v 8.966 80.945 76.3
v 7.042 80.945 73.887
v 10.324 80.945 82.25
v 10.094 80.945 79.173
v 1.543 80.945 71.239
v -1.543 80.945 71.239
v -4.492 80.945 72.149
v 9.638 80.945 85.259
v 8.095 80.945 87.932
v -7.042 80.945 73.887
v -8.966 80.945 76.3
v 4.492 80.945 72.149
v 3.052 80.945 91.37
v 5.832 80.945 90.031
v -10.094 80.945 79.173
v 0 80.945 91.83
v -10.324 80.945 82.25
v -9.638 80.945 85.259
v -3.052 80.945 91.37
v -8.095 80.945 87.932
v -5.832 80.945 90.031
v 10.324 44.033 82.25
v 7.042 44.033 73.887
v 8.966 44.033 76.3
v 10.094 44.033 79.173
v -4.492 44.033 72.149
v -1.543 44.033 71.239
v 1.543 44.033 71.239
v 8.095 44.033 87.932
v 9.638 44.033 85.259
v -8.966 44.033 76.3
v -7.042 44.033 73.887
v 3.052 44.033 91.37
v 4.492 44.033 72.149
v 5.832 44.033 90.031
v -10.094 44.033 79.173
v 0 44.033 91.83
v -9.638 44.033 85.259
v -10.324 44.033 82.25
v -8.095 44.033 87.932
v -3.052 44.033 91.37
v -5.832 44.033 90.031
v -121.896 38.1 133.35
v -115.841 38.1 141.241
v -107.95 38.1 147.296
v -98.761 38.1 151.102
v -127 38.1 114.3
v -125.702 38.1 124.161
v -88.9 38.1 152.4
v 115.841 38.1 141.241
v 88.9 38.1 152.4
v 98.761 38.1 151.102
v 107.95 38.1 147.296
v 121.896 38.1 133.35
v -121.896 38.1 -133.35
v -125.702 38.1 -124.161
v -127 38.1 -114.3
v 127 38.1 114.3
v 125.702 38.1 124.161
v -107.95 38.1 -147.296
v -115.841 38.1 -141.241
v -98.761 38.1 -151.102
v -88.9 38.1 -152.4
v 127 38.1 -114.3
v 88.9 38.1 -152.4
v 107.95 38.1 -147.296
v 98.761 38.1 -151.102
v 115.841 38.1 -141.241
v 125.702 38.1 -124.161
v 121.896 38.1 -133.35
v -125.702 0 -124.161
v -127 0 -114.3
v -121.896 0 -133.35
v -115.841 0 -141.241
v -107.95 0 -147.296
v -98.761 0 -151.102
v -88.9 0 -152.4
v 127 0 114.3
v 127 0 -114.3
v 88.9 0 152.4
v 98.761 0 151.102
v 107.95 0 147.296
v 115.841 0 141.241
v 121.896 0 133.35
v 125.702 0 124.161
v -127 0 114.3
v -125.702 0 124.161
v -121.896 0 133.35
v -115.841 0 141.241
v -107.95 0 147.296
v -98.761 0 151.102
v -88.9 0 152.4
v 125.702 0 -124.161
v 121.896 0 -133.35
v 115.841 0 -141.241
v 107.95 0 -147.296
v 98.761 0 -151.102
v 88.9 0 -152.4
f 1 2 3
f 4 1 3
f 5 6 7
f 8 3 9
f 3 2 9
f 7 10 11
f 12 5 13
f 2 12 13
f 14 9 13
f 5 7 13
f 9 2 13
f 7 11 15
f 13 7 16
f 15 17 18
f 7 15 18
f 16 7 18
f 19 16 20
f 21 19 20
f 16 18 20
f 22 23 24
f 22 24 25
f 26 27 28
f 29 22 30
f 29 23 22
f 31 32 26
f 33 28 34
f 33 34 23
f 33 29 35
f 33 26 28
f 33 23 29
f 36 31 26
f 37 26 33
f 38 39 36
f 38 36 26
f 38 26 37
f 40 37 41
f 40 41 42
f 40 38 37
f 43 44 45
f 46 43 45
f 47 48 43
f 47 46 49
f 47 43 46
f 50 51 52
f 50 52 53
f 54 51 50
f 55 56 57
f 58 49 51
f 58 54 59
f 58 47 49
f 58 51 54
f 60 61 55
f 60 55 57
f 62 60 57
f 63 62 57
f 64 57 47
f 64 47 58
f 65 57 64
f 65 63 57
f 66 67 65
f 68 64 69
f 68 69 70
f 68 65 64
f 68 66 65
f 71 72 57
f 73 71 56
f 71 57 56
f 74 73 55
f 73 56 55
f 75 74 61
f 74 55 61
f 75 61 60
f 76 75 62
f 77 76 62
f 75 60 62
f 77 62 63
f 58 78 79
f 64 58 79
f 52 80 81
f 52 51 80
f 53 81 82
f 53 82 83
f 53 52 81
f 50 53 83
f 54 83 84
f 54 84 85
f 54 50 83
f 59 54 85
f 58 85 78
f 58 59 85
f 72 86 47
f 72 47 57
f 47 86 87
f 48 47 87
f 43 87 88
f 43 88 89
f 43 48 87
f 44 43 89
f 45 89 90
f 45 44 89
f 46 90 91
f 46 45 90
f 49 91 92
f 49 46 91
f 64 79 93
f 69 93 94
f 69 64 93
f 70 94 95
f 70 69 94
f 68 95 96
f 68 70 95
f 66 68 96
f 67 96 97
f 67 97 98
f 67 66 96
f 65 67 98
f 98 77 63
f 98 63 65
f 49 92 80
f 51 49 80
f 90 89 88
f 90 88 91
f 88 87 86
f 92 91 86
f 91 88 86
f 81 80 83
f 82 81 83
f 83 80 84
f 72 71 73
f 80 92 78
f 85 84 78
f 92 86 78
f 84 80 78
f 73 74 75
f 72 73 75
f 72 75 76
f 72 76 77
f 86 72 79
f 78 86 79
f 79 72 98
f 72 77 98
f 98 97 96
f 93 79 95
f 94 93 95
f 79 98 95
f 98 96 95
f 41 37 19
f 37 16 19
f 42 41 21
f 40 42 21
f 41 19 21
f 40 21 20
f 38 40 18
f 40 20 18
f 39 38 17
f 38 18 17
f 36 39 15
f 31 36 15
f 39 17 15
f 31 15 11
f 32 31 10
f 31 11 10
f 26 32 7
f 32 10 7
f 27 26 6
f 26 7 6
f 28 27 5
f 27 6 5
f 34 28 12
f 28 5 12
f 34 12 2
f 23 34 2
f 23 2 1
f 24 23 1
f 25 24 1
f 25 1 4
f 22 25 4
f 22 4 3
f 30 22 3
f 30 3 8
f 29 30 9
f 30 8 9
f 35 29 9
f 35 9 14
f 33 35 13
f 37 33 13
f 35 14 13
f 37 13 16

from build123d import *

# Parameters (mm, degrees)
SKETCH1_W           = 254
SKETCH1_H           = 304.8
BOSS_EXTRUDE1_DEPTH = 38.1
FILLET1_R           = 38.1
SKETCH4_W           = 10.353395652
SKETCH4_H           = 36.912106238


with BuildPart() as part:
    # Sketch1 → Boss-Extrude1 (new body)
    with BuildSketch(Plane(origin=(0, 0, 0), x_dir=(1, 0, 0), z_dir=(0, 1, 0))):
        Rectangle(SKETCH1_W, SKETCH1_H)
    extrude(amount=BOSS_EXTRUDE1_DEPTH)

    # Fillet1
    fillet1_edges = [part.edges().sort_by_distance(p)[0] for p in [
        (-127, 19.05, -152.4),
        (127, 19.05, -152.4),
        (127, 19.05, 152.4),
        (-127, 19.05, 152.4),
    ]]
    fillet(fillet1_edges, radius=FILLET1_R)


with BuildPart() as body_2:
    # Sketch4 → Revolve1 (revolve)
    with BuildSketch(Plane(origin=(0, 0, 0), x_dir=(0, 0, -1), z_dir=(1, 0, 0))):
        with Locations((-86.653420131, 62.489246975)):
            Rectangle(SKETCH4_W, SKETCH4_H)
    revolve(axis=Axis((0, 80.945300094, 81.476722305), (0, -1, 0)))


solid = Compound([part.part, body_2.part])
